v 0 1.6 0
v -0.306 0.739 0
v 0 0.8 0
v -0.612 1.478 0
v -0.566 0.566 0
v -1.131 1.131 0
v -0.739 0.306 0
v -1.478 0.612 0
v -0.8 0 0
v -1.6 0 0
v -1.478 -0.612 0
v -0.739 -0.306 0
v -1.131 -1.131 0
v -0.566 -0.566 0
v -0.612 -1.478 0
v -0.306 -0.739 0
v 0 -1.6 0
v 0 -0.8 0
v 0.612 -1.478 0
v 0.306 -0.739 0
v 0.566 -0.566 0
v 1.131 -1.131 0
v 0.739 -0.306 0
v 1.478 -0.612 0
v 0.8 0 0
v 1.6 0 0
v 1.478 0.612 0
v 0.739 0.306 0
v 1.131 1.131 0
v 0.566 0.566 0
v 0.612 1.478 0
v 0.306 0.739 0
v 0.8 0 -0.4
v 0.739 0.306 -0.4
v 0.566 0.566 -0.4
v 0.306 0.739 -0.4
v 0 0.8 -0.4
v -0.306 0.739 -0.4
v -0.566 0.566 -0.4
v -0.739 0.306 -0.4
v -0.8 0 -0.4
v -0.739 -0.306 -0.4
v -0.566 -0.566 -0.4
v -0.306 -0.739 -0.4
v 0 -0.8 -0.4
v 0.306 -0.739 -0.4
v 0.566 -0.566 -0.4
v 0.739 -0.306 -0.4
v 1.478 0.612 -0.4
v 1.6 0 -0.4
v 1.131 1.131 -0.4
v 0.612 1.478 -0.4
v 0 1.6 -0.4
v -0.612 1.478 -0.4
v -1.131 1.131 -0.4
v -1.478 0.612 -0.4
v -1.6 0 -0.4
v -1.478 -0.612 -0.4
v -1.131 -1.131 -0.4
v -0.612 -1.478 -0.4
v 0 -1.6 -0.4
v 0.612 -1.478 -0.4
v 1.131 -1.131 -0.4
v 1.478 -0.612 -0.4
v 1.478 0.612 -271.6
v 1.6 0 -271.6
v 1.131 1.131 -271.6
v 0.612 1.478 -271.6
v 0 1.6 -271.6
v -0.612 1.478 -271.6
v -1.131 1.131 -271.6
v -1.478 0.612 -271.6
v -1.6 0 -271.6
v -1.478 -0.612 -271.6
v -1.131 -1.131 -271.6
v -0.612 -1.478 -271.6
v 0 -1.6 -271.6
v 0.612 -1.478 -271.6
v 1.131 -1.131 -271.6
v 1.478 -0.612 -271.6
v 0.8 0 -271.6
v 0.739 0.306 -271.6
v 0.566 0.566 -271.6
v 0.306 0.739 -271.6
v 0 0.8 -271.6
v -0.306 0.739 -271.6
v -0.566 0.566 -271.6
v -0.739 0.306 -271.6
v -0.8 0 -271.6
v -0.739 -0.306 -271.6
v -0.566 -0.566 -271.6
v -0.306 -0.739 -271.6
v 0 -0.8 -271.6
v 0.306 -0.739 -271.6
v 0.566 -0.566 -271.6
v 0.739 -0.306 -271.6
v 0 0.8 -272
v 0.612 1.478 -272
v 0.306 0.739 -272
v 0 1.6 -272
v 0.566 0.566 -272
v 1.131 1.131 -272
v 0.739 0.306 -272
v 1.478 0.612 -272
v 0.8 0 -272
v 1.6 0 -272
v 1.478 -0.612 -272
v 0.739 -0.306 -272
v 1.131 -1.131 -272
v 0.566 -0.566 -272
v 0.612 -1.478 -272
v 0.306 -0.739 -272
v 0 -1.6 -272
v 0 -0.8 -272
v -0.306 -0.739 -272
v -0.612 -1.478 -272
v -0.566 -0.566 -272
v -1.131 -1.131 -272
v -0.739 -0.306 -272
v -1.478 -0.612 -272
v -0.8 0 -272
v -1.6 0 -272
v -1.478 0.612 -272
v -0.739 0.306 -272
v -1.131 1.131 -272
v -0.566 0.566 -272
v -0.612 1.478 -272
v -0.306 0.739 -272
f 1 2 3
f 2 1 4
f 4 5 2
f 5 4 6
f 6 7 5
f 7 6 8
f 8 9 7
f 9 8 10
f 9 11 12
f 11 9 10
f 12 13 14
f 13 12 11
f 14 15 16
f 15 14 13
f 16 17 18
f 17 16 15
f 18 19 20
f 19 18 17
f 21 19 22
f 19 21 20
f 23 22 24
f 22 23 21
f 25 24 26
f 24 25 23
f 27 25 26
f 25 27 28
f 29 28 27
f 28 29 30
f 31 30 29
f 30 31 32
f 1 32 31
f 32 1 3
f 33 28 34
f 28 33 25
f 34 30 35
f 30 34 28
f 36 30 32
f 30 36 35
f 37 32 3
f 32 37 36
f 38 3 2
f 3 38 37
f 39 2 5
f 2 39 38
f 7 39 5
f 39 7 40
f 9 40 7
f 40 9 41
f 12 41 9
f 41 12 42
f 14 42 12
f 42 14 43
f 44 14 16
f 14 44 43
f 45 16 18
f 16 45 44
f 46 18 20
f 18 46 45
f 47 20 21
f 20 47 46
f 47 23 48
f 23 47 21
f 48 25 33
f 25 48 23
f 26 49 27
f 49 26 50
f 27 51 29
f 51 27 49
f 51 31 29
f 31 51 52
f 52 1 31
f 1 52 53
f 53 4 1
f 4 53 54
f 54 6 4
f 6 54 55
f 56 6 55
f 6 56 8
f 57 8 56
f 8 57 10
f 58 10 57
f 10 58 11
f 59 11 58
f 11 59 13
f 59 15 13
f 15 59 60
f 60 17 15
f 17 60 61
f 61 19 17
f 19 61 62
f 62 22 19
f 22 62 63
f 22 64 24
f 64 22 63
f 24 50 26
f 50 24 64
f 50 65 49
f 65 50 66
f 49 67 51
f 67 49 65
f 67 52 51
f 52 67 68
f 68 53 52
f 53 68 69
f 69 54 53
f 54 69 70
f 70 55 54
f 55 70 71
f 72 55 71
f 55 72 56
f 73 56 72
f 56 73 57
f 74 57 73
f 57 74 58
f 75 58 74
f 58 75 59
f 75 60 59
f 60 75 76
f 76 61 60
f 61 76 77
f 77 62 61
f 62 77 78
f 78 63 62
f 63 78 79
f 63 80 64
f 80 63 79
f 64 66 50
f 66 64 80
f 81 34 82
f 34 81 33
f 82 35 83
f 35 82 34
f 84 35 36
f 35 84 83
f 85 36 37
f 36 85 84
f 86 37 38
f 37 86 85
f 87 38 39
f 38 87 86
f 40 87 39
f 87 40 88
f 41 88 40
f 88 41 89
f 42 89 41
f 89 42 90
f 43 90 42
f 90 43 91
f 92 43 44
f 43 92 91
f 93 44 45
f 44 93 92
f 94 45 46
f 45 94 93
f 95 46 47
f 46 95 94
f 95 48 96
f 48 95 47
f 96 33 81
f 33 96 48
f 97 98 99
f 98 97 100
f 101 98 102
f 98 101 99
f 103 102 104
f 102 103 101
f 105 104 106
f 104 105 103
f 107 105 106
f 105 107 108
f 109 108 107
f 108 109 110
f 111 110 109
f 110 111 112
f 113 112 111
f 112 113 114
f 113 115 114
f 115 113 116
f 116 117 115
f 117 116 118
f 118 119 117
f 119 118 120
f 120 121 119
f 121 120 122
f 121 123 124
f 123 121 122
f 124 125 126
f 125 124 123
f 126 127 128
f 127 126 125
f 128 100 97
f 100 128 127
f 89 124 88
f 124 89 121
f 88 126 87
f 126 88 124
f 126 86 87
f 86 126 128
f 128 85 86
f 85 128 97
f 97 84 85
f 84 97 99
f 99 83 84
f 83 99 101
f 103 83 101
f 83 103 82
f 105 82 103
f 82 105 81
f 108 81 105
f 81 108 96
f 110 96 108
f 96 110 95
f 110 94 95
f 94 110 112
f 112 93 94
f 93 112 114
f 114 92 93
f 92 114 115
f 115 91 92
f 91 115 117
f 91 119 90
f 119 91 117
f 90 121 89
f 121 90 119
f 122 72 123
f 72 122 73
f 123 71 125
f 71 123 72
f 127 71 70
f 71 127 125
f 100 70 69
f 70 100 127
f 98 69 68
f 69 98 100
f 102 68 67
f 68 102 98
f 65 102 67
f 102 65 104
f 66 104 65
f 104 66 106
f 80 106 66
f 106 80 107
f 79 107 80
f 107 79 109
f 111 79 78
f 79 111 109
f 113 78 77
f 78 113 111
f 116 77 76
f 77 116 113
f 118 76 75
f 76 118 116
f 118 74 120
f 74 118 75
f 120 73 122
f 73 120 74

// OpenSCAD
// file: ../p/4-4ring1.scad
use <../lib.scad>
function ldraw_lib__4_4ring1() = [
// 0 Ring  1 x 1.0
// 0 Name: 4-4ring1.dat
// 0 Author: James Jessiman
// 0 !LDRAW_ORG Primitive UPDATE 2009-01
// 0 !LICENSE Licensed under CC BY 2.0 and CC BY 4.0 : see CAreadme.txt
// 
// 0 BFC CERTIFY CCW
  [0,"BFC","CERTIFY"],
  [0,"BFC","CCW"],
// 
// 0 !HISTORY 1998-12-15 [PTadmin] Official Update 1998-10
// 0 !HISTORY 2002-04-08 [BrickCaster] Modified for BFC compliance
// 0 !HISTORY 2002-04-25 [PTadmin] Official Update 2002-02
// 0 !HISTORY 2007-06-24 [PTadmin] Header formatted for Contributor Agreement
// 0 !HISTORY 2008-07-01 [PTadmin] Official Update 2008-01
// 0 !HISTORY 2008-08-26 [cwdee] Switch polygon winding and rename
// 0 !HISTORY 2009-05-02 [PTadmin] Official Update 2009-01
// 
// 
// 4 16 -0.7654 0 1.8478 -0.3827 0 0.9239 0 0 1 0 0 2
  [4,16,-0.7654,0,1.8478,-0.3827,0,0.9239,0,0,1,0,0,2],
// 4 16 -1.4142 0 1.4142 -0.7071 0 0.7071 -0.3827 0 0.9239 -0.7654 0 1.8478
  [4,16,-1.4142,0,1.4142,-0.7071,0,0.7071,-0.3827,0,0.9239,-0.7654,0,1.8478],
// 4 16 -1.8478 0 0.7654 -0.9239 0 0.3827 -0.7071 0 0.7071 -1.4142 0 1.41420
  [4,16,-1.8478,0,0.7654,-0.9239,0,0.3827,-0.7071,0,0.7071,-1.4142,0,1.41420],
// 4 16 -2 0 0 -1 0 0 -0.9239 0 0.3827 -1.8478 0 0.7654
  [4,16,-2,0,0,-1,0,0,-0.9239,0,0.3827,-1.8478,0,0.7654],
// 4 16 -1.8478 0 -0.7654 -0.9239 0 -0.3827 -1 0 0 -2 0 0
  [4,16,-1.8478,0,-0.7654,-0.9239,0,-0.3827,-1,0,0,-2,0,0],
// 4 16 -1.4142 0 -1.4142 -0.7071 0 -0.7071 -0.9239 0 -0.3827 -1.8478 0 -0.7654
  [4,16,-1.4142,0,-1.4142,-0.7071,0,-0.7071,-0.9239,0,-0.3827,-1.8478,0,-0.7654],
// 4 16 -0.7654 0 -1.8478 -0.3827 0 -0.9239 -0.7071 0 -0.7071 -1.4142 0 -1.4142
  [4,16,-0.7654,0,-1.8478,-0.3827,0,-0.9239,-0.7071,0,-0.7071,-1.4142,0,-1.4142],
// 4 16 0 0 -2 0 0 -1 -0.3827 0 -0.9239 -0.7654 0 -1.8478
  [4,16,0,0,-2,0,0,-1,-0.3827,0,-0.9239,-0.7654,0,-1.8478],
// 4 16 0.7654 0 -1.8478 0.3827 0 -0.9239 0 0 -1 0 0 -2
  [4,16,0.7654,0,-1.8478,0.3827,0,-0.9239,0,0,-1,0,0,-2],
// 4 16 1.4142 0 -1.4142 0.7071 0 -0.7071 0.3827 0 -0.9239 0.7654 0 -1.8478
  [4,16,1.4142,0,-1.4142,0.7071,0,-0.7071,0.3827,0,-0.9239,0.7654,0,-1.8478],
// 4 16 1.8478 0 -0.7654 0.9239 0 -0.3827 0.7071 0 -0.7071 1.4142 0 -1.4142
  [4,16,1.8478,0,-0.7654,0.9239,0,-0.3827,0.7071,0,-0.7071,1.4142,0,-1.4142],
// 4 16 2 0 0 1 0 0 0.9239 0 -0.3827 1.8478 0 -0.7654
  [4,16,2,0,0,1,0,0,0.9239,0,-0.3827,1.8478,0,-0.7654],
// 4 16 1.8478 0 0.7654 0.9239 0 0.3827 1 0 0 2 0 0
  [4,16,1.8478,0,0.7654,0.9239,0,0.3827,1,0,0,2,0,0],
// 4 16 1.4142 0 1.4142 0.7071 0 0.7071 0.9239 0 0.3827 1.8478 0 0.7654
  [4,16,1.4142,0,1.4142,0.7071,0,0.7071,0.9239,0,0.3827,1.8478,0,0.7654],
// 4 16 0.7654 0 1.8478 0.3827 0 0.9239 0.7071 0 0.7071 1.4142 0 1.4142
  [4,16,0.7654,0,1.8478,0.3827,0,0.9239,0.7071,0,0.7071,1.4142,0,1.4142],
// 4 16 0 0 2 0 0 1 0.3827 0 0.9239 0.7654 0 1.8478
  [4,16,0,0,2,0,0,1,0.3827,0,0.9239,0.7654,0,1.8478],
// 0
];
module ldraw_lib__4_4ring1(step=0, col=false, unit=2/5, alt=false, line=0.2, solid=!$preview)
    makepoly(ldraw_lib__4_4ring1(), step=step, col=col, unit=unit, alt=alt, line=line, solid=solid);
ldraw_lib__4_4ring1(line=0.2);
// file: ../p/4-4edge.scad
use <../lib.scad>
function ldraw_lib__4_4edge() = [
// 0 Circle 1.0
// 0 Name: 4-4edge.dat
// 0 Author: James Jessiman
// 0 !LDRAW_ORG Primitive UPDATE 2017-01
// 0 !LICENSE Licensed under CC BY 4.0 : see CAreadme.txt
// 
// 0 BFC CERTIFY CCW
  [0,"BFC","CERTIFY"],
  [0,"BFC","CCW"],
// 
// 0 !HISTORY 1998-12-15 [PTadmin] Official Update 1998-10
// 0 !HISTORY 2005-12-28 [PTadmin] Official Update 2005-01
// 0 !HISTORY 2007-06-24 [PTadmin] Header formatted for Contributor Agreement
// 0 !HISTORY 2008-07-01 [PTadmin] Official Update 2008-01
// 0 !HISTORY 2017-01-15 [Steffen] BFCed
// 0 !HISTORY 2017-12-30 [PTadmin] Official Update 2017-01
// 
// 
// 2 24 1 0 0 0.9239 0 0.3827
  [2,24,1,0,0,0.9239,0,0.3827],
// 2 24 0.9239 0 0.3827 0.7071 0 0.7071
  [2,24,0.9239,0,0.3827,0.7071,0,0.7071],
// 2 24 0.7071 0 0.7071 0.3827 0 0.9239
  [2,24,0.7071,0,0.7071,0.3827,0,0.9239],
// 2 24 0.3827 0 0.9239 0 0 1
  [2,24,0.3827,0,0.9239,0,0,1],
// 2 24 0 0 1 -0.3827 0 0.9239
  [2,24,0,0,1,-0.3827,0,0.9239],
// 2 24 -0.3827 0 0.9239 -0.7071 0 0.7071
  [2,24,-0.3827,0,0.9239,-0.7071,0,0.7071],
// 2 24 -0.7071 0 0.7071 -0.9239 0 0.3827
  [2,24,-0.7071,0,0.7071,-0.9239,0,0.3827],
// 2 24 -0.9239 0 0.3827 -1 0 -0
  [2,24,-0.9239,0,0.3827,-1,0,-0],
// 2 24 -1 0 -0 -0.9239 0 -0.3827
  [2,24,-1,0,-0,-0.9239,0,-0.3827],
// 2 24 -0.9239 0 -0.3827 -0.7071 0 -0.7071
  [2,24,-0.9239,0,-0.3827,-0.7071,0,-0.7071],
// 2 24 -0.7071 0 -0.7071 -0.3827 0 -0.9239
  [2,24,-0.7071,0,-0.7071,-0.3827,0,-0.9239],
// 2 24 -0.3827 0 -0.9239 0 0 -1
  [2,24,-0.3827,0,-0.9239,0,0,-1],
// 2 24 0 0 -1 0.3827 0 -0.9239
  [2,24,0,0,-1,0.3827,0,-0.9239],
// 2 24 0.3827 0 -0.9239 0.7071 0 -0.7071
  [2,24,0.3827,0,-0.9239,0.7071,0,-0.7071],
// 2 24 0.7071 0 -0.7071 0.9239 0 -0.3827
  [2,24,0.7071,0,-0.7071,0.9239,0,-0.3827],
// 2 24 0.9239 0 -0.3827 1 0 0
  [2,24,0.9239,0,-0.3827,1,0,0],
];
module ldraw_lib__4_4edge(step=0, col=false, unit=2/5, alt=false, line=0.2, solid=!$preview)
    makepoly(ldraw_lib__4_4edge(), step=step, col=col, unit=unit, alt=alt, line=line, solid=solid);
ldraw_lib__4_4edge(line=0.2);
// file: ../p/4-4cyli.scad
use <../lib.scad>
function ldraw_lib__4_4cyli() = [
// 0 Cylinder 1.0
// 0 Name: 4-4cyli.dat
// 0 Author: James Jessiman
// 0 !LDRAW_ORG Primitive UPDATE 2005-01
// 0 !LICENSE Licensed under CC BY 2.0 and CC BY 4.0 : see CAreadme.txt
// 
// 0 BFC CERTIFY CCW
  [0,"BFC","CERTIFY"],
  [0,"BFC","CCW"],
// 
// 0 !HISTORY 1998-12-15 [PTadmin] Official Update 1998-10
// 0 !HISTORY 2002-03-23 [sbliss] Added BFC statement; merged headers from files in distributions LDraw 0.27 and Complete.
// 0 !HISTORY 2002-04-25 [PTadmin] Official Update 2002-02
// 0 !HISTORY 2004-12-14 [guyvivan] BFC CCW
// 0 !HISTORY 2005-12-28 [PTadmin] Official Update 2005-01
// 0 !HISTORY 2007-06-24 [PTadmin] Header formatted for Contributor Agreement
// 0 !HISTORY 2008-07-01 [PTadmin] Official Update 2008-01
// 
// 
// 4 16 1 1 0 0.9239 1 0.3827 0.9239 0 0.3827 1 0 0
  [4,16,1,1,0,0.9239,1,0.3827,0.9239,0,0.3827,1,0,0],
// 5 24 1 0 0 1 1 0 0.9239 0 0.3827 0.9239 0 -0.3827
  [5,24,1,0,0,1,1,0,0.9239,0,0.3827,0.9239,0,-0.3827],
// 4 16 0.9239 1 0.3827 0.7071 1 0.7071 0.7071 0 0.7071 0.9239 0 0.3827
  [4,16,0.9239,1,0.3827,0.7071,1,0.7071,0.7071,0,0.7071,0.9239,0,0.3827],
// 5 24 0.9239 0 0.3827 0.9239 1 0.3827 0.7071 0 0.7071 1 0 0
  [5,24,0.9239,0,0.3827,0.9239,1,0.3827,0.7071,0,0.7071,1,0,0],
// 4 16 0.7071 1 0.7071 0.3827 1 0.9239 0.3827 0 0.9239 0.7071 0 0.7071
  [4,16,0.7071,1,0.7071,0.3827,1,0.9239,0.3827,0,0.9239,0.7071,0,0.7071],
// 5 24 0.7071 0 0.7071 0.7071 1 0.7071 0.3827 0 0.9239 0.9239 0 0.3827
  [5,24,0.7071,0,0.7071,0.7071,1,0.7071,0.3827,0,0.9239,0.9239,0,0.3827],
// 4 16 0.3827 1 0.9239 0 1 1 0 0 1 0.3827 0 0.9239
  [4,16,0.3827,1,0.9239,0,1,1,0,0,1,0.3827,0,0.9239],
// 5 24 0.3827 0 0.9239 0.3827 1 0.9239 0 0 1 0.7071 0 0.7071
  [5,24,0.3827,0,0.9239,0.3827,1,0.9239,0,0,1,0.7071,0,0.7071],
// 4 16 0 1 1 -0.3827 1 0.9239 -0.3827 0 0.9239 0 0 1
  [4,16,0,1,1,-0.3827,1,0.9239,-0.3827,0,0.9239,0,0,1],
// 5 24 0 0 1 0 1 1 -0.3827 0 0.9239 0.3827 0 0.9239
  [5,24,0,0,1,0,1,1,-0.3827,0,0.9239,0.3827,0,0.9239],
// 4 16 -0.3827 1 0.9239 -0.7071 1 0.7071 -0.7071 0 0.7071 -0.3827 0 0.9239
  [4,16,-0.3827,1,0.9239,-0.7071,1,0.7071,-0.7071,0,0.7071,-0.3827,0,0.9239],
// 5 24 -0.3827 0 0.9239 -0.3827 1 0.9239 -0.7071 0 0.7071 0 0 1
  [5,24,-0.3827,0,0.9239,-0.3827,1,0.9239,-0.7071,0,0.7071,0,0,1],
// 4 16 -0.7071 1 0.7071 -0.9239 1 0.3827 -0.9239 0 0.3827 -0.7071 0 0.7071
  [4,16,-0.7071,1,0.7071,-0.9239,1,0.3827,-0.9239,0,0.3827,-0.7071,0,0.7071],
// 5 24 -0.7071 0 0.7071 -0.7071 1 0.7071 -0.9239 0 0.3827 -0.3827 0 0.9239
  [5,24,-0.7071,0,0.7071,-0.7071,1,0.7071,-0.9239,0,0.3827,-0.3827,0,0.9239],
// 4 16 -0.9239 1 0.3827 -1 1 0 -1 0 0 -0.9239 0 0.3827
  [4,16,-0.9239,1,0.3827,-1,1,0,-1,0,0,-0.9239,0,0.3827],
// 5 24 -0.9239 0 0.3827 -0.9239 1 0.3827 -1 0 0 -0.7071 0 0.7071
  [5,24,-0.9239,0,0.3827,-0.9239,1,0.3827,-1,0,0,-0.7071,0,0.7071],
// 4 16 -1 1 0 -0.9239 1 -0.3827 -0.9239 0 -0.3827 -1 0 0
  [4,16,-1,1,0,-0.9239,1,-0.3827,-0.9239,0,-0.3827,-1,0,0],
// 5 24 -1 0 0 -1 1 0 -0.9239 0 -0.3827 -0.9239 0 0.3827
  [5,24,-1,0,0,-1,1,0,-0.9239,0,-0.3827,-0.9239,0,0.3827],
// 4 16 -0.9239 1 -0.3827 -0.7071 1 -0.7071 -0.7071 0 -0.7071 -0.9239 0 -0.3827
  [4,16,-0.9239,1,-0.3827,-0.7071,1,-0.7071,-0.7071,0,-0.7071,-0.9239,0,-0.3827],
// 5 24 -0.9239 0 -0.3827 -0.9239 1 -0.3827 -0.7071 0 -0.7071 -1 0 0
  [5,24,-0.9239,0,-0.3827,-0.9239,1,-0.3827,-0.7071,0,-0.7071,-1,0,0],
// 4 16 -0.7071 1 -0.7071 -0.3827 1 -0.9239 -0.3827 0 -0.9239 -0.7071 0 -0.7071
  [4,16,-0.7071,1,-0.7071,-0.3827,1,-0.9239,-0.3827,0,-0.9239,-0.7071,0,-0.7071],
// 5 24 -0.7071 0 -0.7071 -0.7071 1 -0.7071 -0.3827 0 -0.9239 -0.9239 0 -0.3827
  [5,24,-0.7071,0,-0.7071,-0.7071,1,-0.7071,-0.3827,0,-0.9239,-0.9239,0,-0.3827],
// 4 16 -0.3827 1 -0.9239 0 1 -1 0 0 -1 -0.3827 0 -0.9239
  [4,16,-0.3827,1,-0.9239,0,1,-1,0,0,-1,-0.3827,0,-0.9239],
// 5 24 -0.3827 0 -0.9239 -0.3827 1 -0.9239 0 0 -1 -0.7071 0 -0.7071
  [5,24,-0.3827,0,-0.9239,-0.3827,1,-0.9239,0,0,-1,-0.7071,0,-0.7071],
// 4 16 0 1 -1 0.3827 1 -0.9239 0.3827 0 -0.9239 0 0 -1
  [4,16,0,1,-1,0.3827,1,-0.9239,0.3827,0,-0.9239,0,0,-1],
// 5 24 0 0 -1 0 1 -1 0.3827 0 -0.9239 -0.3827 0 -0.9239
  [5,24,0,0,-1,0,1,-1,0.3827,0,-0.9239,-0.3827,0,-0.9239],
// 4 16 0.3827 1 -0.9239 0.7071 1 -0.7071 0.7071 0 -0.7071 0.3827 0 -0.9239
  [4,16,0.3827,1,-0.9239,0.7071,1,-0.7071,0.7071,0,-0.7071,0.3827,0,-0.9239],
// 5 24 0.3827 0 -0.9239 0.3827 1 -0.9239 0.7071 0 -0.7071 0 0 -1
  [5,24,0.3827,0,-0.9239,0.3827,1,-0.9239,0.7071,0,-0.7071,0,0,-1],
// 4 16 0.7071 1 -0.7071 0.9239 1 -0.3827 0.9239 0 -0.3827 0.7071 0 -0.7071
  [4,16,0.7071,1,-0.7071,0.9239,1,-0.3827,0.9239,0,-0.3827,0.7071,0,-0.7071],
// 5 24 0.7071 0 -0.7071 0.7071 1 -0.7071 0.9239 0 -0.3827 0.3827 0 -0.9239
  [5,24,0.7071,0,-0.7071,0.7071,1,-0.7071,0.9239,0,-0.3827,0.3827,0,-0.9239],
// 4 16 0.9239 1 -0.3827 1 1 0 1 0 0 0.9239 0 -0.3827
  [4,16,0.9239,1,-0.3827,1,1,0,1,0,0,0.9239,0,-0.3827],
// 5 24 0.9239 0 -0.3827 0.9239 1 -0.3827 1 0 0 0.7071 0 -0.7071
  [5,24,0.9239,0,-0.3827,0.9239,1,-0.3827,1,0,0,0.7071,0,-0.7071],
// 0
];
module ldraw_lib__4_4cyli(step=0, col=false, unit=2/5, alt=false, line=0.2, solid=!$preview)
    makepoly(ldraw_lib__4_4cyli(), step=step, col=col, unit=unit, alt=alt, line=line, solid=solid);
ldraw_lib__4_4cyli(line=0.2);
// file: u9053.scad
use <../lib.scad>
use <../p/4-4cyli.scad>
use <../p/4-4edge.scad>
use <../p/4-4ring1.scad>
function ldraw_lib__u9053() = [
// 0 ~Technic Flex-System Hose End
// 0 Name: u9053.dat
// 0 Author: William Howard [WilliamH]
// 0 !LDRAW_ORG Part UPDATE 2011-02
// 0 !LICENSE Licensed under CC BY 2.0 and CC BY 4.0 : see CAreadme.txt
// 
// 0 BFC CERTIFY CCW
  [0,"BFC","CERTIFY"],
  [0,"BFC","CCW"],
// 
// 0 !HISTORY 2011-12-21 [cwdee] Reworked subparting technique
// 0 !HISTORY 2011-12-23 [PTadmin] Renamed from 76
// 0 !HISTORY 2011-12-29 [PTadmin] Official Update 2011-02
// 
// 
// 1 16 0 0 0 2 0 0 0 1 0 0 0 2 4-4ring1.dat
  [1,16,0,0,0,2,0,0,0,1,0,0,0,2, ldraw_lib__4_4ring1()],
// 1 16 0 0 0 2 0 0 0 1 0 0 0 2 4-4edge.dat
  [1,16,0,0,0,2,0,0,0,1,0,0,0,2, ldraw_lib__4_4edge()],
// 0 BFC INVERTNEXT
  [0,"BFC","INVERTNEXT"],
// 1 16 0 0 0 2 0 0 0 1 0 0 0 2 4-4cyli.dat
  [1,16,0,0,0,2,0,0,0,1,0,0,0,2, ldraw_lib__4_4cyli()],
// 1 16 0 0 0 4 0 0 0 1 0 0 0 4 4-4edge.dat
  [1,16,0,0,0,4,0,0,0,1,0,0,0,4, ldraw_lib__4_4edge()],
// 1 16 0 0 0 4 0 0 0 1 0 0 0 4 4-4cyli.dat
  [1,16,0,0,0,4,0,0,0,1,0,0,0,4, ldraw_lib__4_4cyli()],
// 0
];
module ldraw_lib__u9053(step=0, col=false, unit=2/5, alt=false, line=0.2, solid=!$preview)
    makepoly(ldraw_lib__u9053(), step=step, col=col, unit=unit, alt=alt, line=line, solid=solid);
ldraw_lib__u9053(line=0.2);
// file: 77.scad
use <../lib.scad>
use <../p/4-4cyli.scad>
function ldraw_lib__77() = [
// 0 ~Technic Flex-System Hose Segment
// 0 Name: 77.dat
// 0 Author: William Howard [WilliamH]
// 0 !LDRAW_ORG Part UPDATE 2011-02
// 0 !LICENSE Licensed under CC BY 2.0 and CC BY 4.0 : see CAreadme.txt
// 
// 0 BFC CERTIFY CCW
  [0,"BFC","CERTIFY"],
  [0,"BFC","CCW"],
// 
// 0 !HISTORY 2011-12-21 [cwdee] Reworked subparting technique
// 0 !HISTORY 2011-12-29 [PTadmin] Official Update 2011-02
// 
// 
// 1 16 0 0 0 4 0 0 0 1 0 0 0 4 4-4cyli.dat
  [1,16,0,0,0,4,0,0,0,1,0,0,0,4, ldraw_lib__4_4cyli()],
// 0 BFC INVERTNEXT
  [0,"BFC","INVERTNEXT"],
// 1 16 0 0 0 2 0 0 0 1 0 0 0 2 4-4cyli.dat
  [1,16,0,0,0,2,0,0,0,1,0,0,0,2, ldraw_lib__4_4cyli()],
// 0
];
module ldraw_lib__77(step=0, col=false, unit=2/5, alt=false, line=0.2, solid=!$preview)
    makepoly(ldraw_lib__77(), step=step, col=col, unit=unit, alt=alt, line=line, solid=solid);
ldraw_lib__77(line=0.2);
// main file
use <../lib.scad>
use <77.scad>
use <u9053.scad>
function ldraw_lib__22461() = [
// 0 Technic Flex-System Hose 34L (680LDU)
// 0 Name: 22461.dat
// 0 Author: Tim Gould [timgould]
// 0 !LDRAW_ORG Part UPDATE 2011-02
// 0 !LICENSE Licensed under CC BY 4.0 : see CAreadme.txt
// 
// 0 BFC CERTIFY CCW
  [0,"BFC","CERTIFY"],
  [0,"BFC","CCW"],
// 
// 0 !KEYWORDS bar, tube
// 
// 0 !HISTORY 2011-12-29 [PTadmin] Official Update 2011-02
// 
// 
// 1 16 0 0 0 1 0 0 0 1 0 0 0 1 u9053.dat
  [1,16,0,0,0,1,0,0,0,1,0,0,0,1, ldraw_lib__u9053()],
// 1 16 0 1 0 1 0 0 0 678 0 0 0 1 77.dat
  [1,16,0,1,0,1,0,0,0,678,0,0,0,1, ldraw_lib__77()],
// 1 16 0 680 0 -1 0 0 0 -1 0 0 0 1 u9053.dat
  [1,16,0,680,0,-1,0,0,0,-1,0,0,0,1, ldraw_lib__u9053()],
];
module ldraw_lib__22461(step=0, col=false, unit=2/5, alt=false, line=0.2, solid=!$preview)
    makepoly(ldraw_lib__22461(), step=step, col=col, unit=unit, alt=alt, line=line, solid=solid);
ldraw_lib__22461(line=0.2);
